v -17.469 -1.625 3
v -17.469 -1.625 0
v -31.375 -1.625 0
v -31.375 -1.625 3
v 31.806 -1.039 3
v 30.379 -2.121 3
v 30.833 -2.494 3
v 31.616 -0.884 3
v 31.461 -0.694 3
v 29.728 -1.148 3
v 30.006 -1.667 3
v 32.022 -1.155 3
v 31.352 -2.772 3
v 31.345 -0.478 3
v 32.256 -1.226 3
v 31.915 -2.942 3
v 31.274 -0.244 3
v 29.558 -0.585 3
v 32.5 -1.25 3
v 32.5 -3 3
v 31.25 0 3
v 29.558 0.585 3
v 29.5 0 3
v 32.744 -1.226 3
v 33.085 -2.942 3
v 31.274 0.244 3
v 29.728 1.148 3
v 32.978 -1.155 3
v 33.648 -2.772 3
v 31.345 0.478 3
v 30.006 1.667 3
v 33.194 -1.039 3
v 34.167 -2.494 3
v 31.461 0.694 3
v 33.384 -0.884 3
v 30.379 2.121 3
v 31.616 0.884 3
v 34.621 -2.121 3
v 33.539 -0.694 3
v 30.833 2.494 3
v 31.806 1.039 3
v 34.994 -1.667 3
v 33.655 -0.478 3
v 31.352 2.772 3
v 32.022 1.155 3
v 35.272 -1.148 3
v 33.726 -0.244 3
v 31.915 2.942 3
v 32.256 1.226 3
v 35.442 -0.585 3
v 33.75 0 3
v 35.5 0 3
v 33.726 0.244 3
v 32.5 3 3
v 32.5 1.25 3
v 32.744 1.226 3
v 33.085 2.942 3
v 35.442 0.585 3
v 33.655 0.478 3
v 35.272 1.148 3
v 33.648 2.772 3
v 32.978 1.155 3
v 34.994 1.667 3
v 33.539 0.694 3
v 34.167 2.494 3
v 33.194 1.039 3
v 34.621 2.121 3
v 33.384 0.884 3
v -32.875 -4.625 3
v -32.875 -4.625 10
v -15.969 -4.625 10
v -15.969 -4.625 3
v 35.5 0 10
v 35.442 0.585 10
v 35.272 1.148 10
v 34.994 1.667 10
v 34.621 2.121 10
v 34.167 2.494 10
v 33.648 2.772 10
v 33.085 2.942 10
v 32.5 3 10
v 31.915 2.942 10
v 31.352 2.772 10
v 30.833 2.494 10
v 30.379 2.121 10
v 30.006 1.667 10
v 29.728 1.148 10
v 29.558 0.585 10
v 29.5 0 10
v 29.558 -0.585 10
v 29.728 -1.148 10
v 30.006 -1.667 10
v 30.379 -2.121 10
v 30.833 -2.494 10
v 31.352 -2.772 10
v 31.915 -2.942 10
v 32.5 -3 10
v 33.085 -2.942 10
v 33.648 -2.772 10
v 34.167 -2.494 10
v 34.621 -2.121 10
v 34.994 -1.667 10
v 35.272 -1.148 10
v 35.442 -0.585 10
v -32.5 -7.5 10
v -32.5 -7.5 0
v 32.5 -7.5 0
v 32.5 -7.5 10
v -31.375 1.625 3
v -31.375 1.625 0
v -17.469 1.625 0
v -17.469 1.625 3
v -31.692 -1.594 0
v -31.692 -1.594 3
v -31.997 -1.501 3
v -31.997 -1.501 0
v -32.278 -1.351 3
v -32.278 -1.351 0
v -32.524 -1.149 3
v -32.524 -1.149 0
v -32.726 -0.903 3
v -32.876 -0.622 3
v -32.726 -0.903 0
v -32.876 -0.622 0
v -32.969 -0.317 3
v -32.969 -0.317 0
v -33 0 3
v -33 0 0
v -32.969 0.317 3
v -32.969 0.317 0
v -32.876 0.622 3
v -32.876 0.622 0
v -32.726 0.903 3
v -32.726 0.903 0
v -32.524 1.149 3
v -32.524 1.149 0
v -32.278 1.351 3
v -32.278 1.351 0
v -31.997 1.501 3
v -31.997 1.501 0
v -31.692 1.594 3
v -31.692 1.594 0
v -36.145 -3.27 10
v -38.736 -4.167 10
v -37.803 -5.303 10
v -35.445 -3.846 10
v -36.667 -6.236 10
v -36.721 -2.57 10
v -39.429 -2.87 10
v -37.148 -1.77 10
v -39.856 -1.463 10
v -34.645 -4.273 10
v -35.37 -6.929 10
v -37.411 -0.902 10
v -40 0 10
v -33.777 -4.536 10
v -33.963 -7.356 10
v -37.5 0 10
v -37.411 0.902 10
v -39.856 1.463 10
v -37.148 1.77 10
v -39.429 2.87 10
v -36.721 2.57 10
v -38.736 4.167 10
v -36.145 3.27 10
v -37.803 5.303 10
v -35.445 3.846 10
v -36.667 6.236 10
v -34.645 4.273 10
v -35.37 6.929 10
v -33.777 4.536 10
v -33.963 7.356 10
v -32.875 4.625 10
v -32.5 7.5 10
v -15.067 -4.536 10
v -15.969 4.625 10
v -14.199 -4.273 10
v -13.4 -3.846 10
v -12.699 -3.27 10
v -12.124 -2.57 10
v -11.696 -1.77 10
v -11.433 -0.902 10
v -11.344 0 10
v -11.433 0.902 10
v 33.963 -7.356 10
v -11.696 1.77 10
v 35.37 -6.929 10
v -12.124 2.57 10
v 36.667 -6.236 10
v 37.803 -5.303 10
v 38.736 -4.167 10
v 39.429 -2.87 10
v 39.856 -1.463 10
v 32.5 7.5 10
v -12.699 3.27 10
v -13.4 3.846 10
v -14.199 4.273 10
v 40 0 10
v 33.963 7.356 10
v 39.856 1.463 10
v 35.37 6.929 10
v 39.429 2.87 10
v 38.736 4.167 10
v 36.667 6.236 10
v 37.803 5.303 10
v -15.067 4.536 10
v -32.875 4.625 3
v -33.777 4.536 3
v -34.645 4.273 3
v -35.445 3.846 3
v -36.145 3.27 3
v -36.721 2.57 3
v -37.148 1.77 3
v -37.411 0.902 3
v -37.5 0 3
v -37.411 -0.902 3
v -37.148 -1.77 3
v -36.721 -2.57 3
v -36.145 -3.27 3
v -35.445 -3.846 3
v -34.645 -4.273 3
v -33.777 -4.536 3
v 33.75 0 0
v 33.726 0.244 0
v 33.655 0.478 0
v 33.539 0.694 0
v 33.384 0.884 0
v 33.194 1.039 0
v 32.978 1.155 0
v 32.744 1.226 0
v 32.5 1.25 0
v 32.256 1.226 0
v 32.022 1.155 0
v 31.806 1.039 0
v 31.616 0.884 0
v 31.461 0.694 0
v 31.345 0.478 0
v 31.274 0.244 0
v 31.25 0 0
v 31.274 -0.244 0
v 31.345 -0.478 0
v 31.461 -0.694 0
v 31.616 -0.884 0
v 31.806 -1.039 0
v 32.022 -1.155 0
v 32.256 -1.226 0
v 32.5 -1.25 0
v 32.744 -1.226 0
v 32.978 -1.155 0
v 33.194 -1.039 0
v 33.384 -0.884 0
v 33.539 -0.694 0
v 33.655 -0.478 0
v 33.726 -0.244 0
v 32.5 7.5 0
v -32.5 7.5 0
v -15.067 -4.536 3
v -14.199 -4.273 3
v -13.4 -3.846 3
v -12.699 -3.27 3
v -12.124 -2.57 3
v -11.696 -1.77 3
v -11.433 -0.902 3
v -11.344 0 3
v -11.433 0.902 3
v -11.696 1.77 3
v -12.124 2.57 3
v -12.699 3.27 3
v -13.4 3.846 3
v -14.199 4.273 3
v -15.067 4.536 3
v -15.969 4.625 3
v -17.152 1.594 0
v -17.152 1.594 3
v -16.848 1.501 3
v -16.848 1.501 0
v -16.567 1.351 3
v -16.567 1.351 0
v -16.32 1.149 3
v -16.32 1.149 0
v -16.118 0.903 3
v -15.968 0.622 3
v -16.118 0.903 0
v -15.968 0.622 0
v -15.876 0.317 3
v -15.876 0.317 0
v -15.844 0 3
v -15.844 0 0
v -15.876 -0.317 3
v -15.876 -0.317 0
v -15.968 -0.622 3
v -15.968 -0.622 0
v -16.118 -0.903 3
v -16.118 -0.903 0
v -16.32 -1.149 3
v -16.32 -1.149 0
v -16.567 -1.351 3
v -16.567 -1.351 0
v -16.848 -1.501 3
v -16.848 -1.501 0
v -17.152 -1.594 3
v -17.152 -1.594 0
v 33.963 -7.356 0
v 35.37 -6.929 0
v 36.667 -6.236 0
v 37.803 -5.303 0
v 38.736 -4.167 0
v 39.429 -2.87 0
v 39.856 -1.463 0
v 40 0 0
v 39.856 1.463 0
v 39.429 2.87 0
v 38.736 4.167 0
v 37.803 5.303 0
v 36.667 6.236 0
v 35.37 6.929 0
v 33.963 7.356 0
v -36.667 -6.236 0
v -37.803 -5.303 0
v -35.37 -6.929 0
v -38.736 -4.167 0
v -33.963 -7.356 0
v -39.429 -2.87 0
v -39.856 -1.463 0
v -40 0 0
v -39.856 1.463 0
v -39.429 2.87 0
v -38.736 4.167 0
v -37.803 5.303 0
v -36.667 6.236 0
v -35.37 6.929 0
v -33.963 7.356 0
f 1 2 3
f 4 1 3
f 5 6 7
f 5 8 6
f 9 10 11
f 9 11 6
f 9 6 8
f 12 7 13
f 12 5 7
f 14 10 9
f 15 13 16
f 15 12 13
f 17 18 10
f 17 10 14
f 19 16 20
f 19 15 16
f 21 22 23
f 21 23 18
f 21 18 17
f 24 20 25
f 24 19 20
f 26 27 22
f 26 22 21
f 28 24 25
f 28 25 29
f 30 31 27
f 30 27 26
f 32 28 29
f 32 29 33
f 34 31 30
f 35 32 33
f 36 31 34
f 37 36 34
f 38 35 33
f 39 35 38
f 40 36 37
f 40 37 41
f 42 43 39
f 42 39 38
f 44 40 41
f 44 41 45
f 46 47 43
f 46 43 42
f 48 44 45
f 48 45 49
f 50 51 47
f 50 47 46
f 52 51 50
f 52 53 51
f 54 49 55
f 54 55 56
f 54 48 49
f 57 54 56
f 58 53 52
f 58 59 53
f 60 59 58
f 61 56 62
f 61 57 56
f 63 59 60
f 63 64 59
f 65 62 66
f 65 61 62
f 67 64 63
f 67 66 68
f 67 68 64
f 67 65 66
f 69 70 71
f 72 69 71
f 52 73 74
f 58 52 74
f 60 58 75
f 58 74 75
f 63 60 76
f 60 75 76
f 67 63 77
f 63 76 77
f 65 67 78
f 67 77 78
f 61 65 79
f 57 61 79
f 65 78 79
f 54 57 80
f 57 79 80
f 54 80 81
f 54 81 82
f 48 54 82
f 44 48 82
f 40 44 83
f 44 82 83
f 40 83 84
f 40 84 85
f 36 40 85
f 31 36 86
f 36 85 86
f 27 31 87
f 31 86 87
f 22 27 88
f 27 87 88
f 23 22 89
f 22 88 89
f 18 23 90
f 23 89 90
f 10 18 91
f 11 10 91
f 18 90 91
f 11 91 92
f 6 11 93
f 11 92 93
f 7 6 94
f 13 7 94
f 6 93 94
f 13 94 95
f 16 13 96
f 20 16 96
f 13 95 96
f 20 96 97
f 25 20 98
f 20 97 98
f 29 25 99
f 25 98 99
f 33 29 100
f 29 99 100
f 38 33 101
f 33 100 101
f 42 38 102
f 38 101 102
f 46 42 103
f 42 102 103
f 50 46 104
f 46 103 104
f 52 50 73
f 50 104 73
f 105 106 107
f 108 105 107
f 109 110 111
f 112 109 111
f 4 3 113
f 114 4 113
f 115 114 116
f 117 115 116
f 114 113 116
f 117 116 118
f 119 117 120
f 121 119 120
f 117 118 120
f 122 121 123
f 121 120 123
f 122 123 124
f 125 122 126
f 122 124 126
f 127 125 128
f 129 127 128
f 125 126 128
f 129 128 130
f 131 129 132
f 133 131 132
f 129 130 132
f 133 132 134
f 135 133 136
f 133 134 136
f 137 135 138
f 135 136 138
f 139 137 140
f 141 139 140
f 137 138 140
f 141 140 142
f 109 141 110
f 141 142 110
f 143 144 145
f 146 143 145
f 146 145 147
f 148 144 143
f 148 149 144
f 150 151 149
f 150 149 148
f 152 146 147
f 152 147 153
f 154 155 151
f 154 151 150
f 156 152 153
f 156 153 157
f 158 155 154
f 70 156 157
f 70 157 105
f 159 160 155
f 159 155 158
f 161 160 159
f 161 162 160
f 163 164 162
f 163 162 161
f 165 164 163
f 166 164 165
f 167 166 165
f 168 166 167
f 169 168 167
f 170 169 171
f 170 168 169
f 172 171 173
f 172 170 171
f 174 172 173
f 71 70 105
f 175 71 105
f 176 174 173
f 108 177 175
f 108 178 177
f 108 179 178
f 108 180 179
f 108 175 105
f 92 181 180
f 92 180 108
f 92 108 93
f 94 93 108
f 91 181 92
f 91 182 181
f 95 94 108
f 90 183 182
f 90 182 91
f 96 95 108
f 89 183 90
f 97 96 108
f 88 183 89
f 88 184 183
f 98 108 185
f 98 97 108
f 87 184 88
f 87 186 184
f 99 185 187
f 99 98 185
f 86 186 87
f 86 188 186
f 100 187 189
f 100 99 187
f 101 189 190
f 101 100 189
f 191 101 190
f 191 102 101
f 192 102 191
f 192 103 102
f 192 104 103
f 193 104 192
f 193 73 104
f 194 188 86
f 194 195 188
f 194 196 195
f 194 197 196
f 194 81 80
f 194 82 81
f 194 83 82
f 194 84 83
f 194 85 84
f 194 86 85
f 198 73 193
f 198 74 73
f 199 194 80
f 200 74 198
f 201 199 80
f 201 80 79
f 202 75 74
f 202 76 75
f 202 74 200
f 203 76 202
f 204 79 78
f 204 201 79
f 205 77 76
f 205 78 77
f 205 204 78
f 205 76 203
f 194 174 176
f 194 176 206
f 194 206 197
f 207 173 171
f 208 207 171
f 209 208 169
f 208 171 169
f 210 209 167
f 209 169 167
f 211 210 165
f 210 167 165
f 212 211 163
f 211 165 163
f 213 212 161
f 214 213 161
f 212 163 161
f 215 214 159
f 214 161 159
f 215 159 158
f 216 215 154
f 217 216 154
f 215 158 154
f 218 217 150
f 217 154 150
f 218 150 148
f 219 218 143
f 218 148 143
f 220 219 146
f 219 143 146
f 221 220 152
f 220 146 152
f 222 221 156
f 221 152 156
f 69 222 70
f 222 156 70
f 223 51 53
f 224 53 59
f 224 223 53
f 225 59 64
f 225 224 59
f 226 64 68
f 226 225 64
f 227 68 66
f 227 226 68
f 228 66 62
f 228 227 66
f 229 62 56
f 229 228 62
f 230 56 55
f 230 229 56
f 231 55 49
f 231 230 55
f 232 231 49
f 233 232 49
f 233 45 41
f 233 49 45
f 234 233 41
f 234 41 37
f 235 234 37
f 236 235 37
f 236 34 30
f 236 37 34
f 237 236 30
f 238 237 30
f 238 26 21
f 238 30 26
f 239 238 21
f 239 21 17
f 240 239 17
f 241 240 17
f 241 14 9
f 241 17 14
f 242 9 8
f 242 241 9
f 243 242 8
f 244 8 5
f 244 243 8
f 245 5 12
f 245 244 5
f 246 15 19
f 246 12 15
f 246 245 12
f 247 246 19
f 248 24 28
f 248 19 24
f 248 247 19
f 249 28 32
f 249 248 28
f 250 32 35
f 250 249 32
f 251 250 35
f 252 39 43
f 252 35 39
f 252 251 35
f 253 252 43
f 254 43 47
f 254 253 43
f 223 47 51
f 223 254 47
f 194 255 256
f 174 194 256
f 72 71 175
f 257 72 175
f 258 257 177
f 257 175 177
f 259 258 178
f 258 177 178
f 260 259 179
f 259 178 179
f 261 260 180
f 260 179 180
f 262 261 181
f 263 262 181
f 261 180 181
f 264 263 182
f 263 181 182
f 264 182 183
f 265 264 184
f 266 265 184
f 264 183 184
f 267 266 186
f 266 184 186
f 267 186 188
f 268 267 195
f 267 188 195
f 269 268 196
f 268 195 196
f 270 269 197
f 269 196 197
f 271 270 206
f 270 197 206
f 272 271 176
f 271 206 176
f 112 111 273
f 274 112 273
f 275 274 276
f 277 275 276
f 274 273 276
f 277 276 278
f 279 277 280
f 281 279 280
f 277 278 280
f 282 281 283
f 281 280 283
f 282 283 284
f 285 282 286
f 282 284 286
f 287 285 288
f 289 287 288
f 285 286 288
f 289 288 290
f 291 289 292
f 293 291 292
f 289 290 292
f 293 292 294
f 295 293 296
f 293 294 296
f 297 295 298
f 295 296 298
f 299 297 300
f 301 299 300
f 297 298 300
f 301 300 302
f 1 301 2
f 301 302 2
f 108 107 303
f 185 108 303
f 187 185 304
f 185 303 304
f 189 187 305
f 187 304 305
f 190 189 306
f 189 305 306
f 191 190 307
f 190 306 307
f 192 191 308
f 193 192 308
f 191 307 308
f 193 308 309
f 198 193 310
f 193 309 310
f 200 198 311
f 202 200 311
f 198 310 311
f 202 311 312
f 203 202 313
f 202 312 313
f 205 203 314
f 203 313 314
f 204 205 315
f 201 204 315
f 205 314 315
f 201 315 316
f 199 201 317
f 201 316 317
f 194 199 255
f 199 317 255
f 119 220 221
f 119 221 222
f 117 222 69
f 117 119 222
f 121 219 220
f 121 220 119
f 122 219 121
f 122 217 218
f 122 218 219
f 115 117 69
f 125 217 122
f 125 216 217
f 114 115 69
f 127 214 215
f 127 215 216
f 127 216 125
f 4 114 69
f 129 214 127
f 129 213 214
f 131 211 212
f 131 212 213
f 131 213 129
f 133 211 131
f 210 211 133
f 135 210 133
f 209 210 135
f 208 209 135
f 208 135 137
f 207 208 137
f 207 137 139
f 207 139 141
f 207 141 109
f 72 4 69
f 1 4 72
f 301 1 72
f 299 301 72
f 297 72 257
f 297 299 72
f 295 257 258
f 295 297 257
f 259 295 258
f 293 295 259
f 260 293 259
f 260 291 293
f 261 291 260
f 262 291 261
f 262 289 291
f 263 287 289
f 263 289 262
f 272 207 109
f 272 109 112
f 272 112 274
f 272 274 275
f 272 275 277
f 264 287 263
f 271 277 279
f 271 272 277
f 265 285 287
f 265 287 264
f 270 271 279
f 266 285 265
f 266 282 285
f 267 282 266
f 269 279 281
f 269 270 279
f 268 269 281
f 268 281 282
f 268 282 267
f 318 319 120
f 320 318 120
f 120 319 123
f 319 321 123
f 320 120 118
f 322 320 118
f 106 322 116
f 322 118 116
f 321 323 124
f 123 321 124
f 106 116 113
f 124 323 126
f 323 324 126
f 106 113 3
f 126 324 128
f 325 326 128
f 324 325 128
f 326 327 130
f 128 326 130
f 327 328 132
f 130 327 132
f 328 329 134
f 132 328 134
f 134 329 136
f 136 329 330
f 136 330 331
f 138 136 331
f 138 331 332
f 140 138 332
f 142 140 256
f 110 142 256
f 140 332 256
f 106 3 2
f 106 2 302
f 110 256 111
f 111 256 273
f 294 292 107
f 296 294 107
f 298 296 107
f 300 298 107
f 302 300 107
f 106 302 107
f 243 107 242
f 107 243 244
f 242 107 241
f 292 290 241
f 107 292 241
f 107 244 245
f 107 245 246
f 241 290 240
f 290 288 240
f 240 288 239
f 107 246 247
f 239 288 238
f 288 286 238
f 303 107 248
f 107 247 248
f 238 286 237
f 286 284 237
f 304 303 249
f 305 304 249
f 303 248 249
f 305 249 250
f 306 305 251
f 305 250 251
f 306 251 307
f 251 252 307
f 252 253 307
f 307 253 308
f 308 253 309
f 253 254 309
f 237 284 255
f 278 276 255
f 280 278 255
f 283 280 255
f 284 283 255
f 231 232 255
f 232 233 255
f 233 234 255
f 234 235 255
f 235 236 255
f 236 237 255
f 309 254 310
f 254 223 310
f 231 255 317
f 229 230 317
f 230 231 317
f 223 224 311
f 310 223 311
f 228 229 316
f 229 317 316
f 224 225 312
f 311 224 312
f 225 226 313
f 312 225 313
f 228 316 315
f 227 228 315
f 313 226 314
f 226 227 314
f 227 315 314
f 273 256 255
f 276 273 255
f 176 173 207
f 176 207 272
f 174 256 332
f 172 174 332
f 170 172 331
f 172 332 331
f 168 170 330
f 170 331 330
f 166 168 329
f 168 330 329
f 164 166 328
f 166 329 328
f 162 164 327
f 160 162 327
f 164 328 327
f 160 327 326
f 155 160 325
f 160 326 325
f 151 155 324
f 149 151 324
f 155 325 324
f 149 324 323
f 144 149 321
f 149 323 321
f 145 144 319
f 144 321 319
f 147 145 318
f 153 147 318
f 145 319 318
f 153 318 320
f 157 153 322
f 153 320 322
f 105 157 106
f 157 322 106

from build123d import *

# Parameters (mm, degrees)
F0_R     = 1.25
F1_DEPTH = 10
F3_R     = 3
F3_W     = 16.9056220651
F3_H     = 9.25
F4_DEPTH = 7


with BuildPart() as f1:
    # F0 (on Top) → F1 (new body)
    with BuildSketch(Plane.XY):
        with BuildLine():
            ThreePointArc((32.5, -7.5), (40, 0), (32.5, 7.5))
            Line((32.5, 7.5), (-32.5, 7.5))
            ThreePointArc((-32.5, 7.5), (-40, 0), (-32.5, -7.5))
            Line((-32.5, -7.5), (32.5, -7.5))
        make_face()
        with BuildLine():
            ThreePointArc((-17.4693779349, 1.625), (-15.8443779349, 0), (-17.4693779349, -1.625))
            Line((-17.4693779349, -1.625), (-31.375, -1.625))
            ThreePointArc((-31.375, -1.625), (-33, 0), (-31.375, 1.625))
            Line((-31.375, 1.625), (-17.4693779349, 1.625))
        make_face(mode=Mode.SUBTRACT)
        with Locations((32.5, 0)):
            Circle(F0_R, mode=Mode.SUBTRACT)
    extrude(amount=F1_DEPTH)

    # F3 (on offset) → F4 (cut)
    with BuildSketch(Plane.XY.offset(10)):
        with Locations((32.5, 0)):
            Circle(F3_R)
        with Locations((-24.4221889675, 0)):
            Rectangle(F3_W, F3_H)
        with BuildLine():
            Line((-32.875, -4.625), (-32.875, 4.625))
            ThreePointArc((-32.875, 4.625), (-37.5, 0), (-32.875, -4.625))
        make_face()
        with BuildLine():
            ThreePointArc((-15.9693779349, -4.625), (-11.3443779349, 0), (-15.9693779349, 4.625))
            Line((-15.9693779349, 4.625), (-15.9693779349, -4.625))
        make_face()
    extrude(amount=-F4_DEPTH, mode=Mode.SUBTRACT)


solid = f1.part
